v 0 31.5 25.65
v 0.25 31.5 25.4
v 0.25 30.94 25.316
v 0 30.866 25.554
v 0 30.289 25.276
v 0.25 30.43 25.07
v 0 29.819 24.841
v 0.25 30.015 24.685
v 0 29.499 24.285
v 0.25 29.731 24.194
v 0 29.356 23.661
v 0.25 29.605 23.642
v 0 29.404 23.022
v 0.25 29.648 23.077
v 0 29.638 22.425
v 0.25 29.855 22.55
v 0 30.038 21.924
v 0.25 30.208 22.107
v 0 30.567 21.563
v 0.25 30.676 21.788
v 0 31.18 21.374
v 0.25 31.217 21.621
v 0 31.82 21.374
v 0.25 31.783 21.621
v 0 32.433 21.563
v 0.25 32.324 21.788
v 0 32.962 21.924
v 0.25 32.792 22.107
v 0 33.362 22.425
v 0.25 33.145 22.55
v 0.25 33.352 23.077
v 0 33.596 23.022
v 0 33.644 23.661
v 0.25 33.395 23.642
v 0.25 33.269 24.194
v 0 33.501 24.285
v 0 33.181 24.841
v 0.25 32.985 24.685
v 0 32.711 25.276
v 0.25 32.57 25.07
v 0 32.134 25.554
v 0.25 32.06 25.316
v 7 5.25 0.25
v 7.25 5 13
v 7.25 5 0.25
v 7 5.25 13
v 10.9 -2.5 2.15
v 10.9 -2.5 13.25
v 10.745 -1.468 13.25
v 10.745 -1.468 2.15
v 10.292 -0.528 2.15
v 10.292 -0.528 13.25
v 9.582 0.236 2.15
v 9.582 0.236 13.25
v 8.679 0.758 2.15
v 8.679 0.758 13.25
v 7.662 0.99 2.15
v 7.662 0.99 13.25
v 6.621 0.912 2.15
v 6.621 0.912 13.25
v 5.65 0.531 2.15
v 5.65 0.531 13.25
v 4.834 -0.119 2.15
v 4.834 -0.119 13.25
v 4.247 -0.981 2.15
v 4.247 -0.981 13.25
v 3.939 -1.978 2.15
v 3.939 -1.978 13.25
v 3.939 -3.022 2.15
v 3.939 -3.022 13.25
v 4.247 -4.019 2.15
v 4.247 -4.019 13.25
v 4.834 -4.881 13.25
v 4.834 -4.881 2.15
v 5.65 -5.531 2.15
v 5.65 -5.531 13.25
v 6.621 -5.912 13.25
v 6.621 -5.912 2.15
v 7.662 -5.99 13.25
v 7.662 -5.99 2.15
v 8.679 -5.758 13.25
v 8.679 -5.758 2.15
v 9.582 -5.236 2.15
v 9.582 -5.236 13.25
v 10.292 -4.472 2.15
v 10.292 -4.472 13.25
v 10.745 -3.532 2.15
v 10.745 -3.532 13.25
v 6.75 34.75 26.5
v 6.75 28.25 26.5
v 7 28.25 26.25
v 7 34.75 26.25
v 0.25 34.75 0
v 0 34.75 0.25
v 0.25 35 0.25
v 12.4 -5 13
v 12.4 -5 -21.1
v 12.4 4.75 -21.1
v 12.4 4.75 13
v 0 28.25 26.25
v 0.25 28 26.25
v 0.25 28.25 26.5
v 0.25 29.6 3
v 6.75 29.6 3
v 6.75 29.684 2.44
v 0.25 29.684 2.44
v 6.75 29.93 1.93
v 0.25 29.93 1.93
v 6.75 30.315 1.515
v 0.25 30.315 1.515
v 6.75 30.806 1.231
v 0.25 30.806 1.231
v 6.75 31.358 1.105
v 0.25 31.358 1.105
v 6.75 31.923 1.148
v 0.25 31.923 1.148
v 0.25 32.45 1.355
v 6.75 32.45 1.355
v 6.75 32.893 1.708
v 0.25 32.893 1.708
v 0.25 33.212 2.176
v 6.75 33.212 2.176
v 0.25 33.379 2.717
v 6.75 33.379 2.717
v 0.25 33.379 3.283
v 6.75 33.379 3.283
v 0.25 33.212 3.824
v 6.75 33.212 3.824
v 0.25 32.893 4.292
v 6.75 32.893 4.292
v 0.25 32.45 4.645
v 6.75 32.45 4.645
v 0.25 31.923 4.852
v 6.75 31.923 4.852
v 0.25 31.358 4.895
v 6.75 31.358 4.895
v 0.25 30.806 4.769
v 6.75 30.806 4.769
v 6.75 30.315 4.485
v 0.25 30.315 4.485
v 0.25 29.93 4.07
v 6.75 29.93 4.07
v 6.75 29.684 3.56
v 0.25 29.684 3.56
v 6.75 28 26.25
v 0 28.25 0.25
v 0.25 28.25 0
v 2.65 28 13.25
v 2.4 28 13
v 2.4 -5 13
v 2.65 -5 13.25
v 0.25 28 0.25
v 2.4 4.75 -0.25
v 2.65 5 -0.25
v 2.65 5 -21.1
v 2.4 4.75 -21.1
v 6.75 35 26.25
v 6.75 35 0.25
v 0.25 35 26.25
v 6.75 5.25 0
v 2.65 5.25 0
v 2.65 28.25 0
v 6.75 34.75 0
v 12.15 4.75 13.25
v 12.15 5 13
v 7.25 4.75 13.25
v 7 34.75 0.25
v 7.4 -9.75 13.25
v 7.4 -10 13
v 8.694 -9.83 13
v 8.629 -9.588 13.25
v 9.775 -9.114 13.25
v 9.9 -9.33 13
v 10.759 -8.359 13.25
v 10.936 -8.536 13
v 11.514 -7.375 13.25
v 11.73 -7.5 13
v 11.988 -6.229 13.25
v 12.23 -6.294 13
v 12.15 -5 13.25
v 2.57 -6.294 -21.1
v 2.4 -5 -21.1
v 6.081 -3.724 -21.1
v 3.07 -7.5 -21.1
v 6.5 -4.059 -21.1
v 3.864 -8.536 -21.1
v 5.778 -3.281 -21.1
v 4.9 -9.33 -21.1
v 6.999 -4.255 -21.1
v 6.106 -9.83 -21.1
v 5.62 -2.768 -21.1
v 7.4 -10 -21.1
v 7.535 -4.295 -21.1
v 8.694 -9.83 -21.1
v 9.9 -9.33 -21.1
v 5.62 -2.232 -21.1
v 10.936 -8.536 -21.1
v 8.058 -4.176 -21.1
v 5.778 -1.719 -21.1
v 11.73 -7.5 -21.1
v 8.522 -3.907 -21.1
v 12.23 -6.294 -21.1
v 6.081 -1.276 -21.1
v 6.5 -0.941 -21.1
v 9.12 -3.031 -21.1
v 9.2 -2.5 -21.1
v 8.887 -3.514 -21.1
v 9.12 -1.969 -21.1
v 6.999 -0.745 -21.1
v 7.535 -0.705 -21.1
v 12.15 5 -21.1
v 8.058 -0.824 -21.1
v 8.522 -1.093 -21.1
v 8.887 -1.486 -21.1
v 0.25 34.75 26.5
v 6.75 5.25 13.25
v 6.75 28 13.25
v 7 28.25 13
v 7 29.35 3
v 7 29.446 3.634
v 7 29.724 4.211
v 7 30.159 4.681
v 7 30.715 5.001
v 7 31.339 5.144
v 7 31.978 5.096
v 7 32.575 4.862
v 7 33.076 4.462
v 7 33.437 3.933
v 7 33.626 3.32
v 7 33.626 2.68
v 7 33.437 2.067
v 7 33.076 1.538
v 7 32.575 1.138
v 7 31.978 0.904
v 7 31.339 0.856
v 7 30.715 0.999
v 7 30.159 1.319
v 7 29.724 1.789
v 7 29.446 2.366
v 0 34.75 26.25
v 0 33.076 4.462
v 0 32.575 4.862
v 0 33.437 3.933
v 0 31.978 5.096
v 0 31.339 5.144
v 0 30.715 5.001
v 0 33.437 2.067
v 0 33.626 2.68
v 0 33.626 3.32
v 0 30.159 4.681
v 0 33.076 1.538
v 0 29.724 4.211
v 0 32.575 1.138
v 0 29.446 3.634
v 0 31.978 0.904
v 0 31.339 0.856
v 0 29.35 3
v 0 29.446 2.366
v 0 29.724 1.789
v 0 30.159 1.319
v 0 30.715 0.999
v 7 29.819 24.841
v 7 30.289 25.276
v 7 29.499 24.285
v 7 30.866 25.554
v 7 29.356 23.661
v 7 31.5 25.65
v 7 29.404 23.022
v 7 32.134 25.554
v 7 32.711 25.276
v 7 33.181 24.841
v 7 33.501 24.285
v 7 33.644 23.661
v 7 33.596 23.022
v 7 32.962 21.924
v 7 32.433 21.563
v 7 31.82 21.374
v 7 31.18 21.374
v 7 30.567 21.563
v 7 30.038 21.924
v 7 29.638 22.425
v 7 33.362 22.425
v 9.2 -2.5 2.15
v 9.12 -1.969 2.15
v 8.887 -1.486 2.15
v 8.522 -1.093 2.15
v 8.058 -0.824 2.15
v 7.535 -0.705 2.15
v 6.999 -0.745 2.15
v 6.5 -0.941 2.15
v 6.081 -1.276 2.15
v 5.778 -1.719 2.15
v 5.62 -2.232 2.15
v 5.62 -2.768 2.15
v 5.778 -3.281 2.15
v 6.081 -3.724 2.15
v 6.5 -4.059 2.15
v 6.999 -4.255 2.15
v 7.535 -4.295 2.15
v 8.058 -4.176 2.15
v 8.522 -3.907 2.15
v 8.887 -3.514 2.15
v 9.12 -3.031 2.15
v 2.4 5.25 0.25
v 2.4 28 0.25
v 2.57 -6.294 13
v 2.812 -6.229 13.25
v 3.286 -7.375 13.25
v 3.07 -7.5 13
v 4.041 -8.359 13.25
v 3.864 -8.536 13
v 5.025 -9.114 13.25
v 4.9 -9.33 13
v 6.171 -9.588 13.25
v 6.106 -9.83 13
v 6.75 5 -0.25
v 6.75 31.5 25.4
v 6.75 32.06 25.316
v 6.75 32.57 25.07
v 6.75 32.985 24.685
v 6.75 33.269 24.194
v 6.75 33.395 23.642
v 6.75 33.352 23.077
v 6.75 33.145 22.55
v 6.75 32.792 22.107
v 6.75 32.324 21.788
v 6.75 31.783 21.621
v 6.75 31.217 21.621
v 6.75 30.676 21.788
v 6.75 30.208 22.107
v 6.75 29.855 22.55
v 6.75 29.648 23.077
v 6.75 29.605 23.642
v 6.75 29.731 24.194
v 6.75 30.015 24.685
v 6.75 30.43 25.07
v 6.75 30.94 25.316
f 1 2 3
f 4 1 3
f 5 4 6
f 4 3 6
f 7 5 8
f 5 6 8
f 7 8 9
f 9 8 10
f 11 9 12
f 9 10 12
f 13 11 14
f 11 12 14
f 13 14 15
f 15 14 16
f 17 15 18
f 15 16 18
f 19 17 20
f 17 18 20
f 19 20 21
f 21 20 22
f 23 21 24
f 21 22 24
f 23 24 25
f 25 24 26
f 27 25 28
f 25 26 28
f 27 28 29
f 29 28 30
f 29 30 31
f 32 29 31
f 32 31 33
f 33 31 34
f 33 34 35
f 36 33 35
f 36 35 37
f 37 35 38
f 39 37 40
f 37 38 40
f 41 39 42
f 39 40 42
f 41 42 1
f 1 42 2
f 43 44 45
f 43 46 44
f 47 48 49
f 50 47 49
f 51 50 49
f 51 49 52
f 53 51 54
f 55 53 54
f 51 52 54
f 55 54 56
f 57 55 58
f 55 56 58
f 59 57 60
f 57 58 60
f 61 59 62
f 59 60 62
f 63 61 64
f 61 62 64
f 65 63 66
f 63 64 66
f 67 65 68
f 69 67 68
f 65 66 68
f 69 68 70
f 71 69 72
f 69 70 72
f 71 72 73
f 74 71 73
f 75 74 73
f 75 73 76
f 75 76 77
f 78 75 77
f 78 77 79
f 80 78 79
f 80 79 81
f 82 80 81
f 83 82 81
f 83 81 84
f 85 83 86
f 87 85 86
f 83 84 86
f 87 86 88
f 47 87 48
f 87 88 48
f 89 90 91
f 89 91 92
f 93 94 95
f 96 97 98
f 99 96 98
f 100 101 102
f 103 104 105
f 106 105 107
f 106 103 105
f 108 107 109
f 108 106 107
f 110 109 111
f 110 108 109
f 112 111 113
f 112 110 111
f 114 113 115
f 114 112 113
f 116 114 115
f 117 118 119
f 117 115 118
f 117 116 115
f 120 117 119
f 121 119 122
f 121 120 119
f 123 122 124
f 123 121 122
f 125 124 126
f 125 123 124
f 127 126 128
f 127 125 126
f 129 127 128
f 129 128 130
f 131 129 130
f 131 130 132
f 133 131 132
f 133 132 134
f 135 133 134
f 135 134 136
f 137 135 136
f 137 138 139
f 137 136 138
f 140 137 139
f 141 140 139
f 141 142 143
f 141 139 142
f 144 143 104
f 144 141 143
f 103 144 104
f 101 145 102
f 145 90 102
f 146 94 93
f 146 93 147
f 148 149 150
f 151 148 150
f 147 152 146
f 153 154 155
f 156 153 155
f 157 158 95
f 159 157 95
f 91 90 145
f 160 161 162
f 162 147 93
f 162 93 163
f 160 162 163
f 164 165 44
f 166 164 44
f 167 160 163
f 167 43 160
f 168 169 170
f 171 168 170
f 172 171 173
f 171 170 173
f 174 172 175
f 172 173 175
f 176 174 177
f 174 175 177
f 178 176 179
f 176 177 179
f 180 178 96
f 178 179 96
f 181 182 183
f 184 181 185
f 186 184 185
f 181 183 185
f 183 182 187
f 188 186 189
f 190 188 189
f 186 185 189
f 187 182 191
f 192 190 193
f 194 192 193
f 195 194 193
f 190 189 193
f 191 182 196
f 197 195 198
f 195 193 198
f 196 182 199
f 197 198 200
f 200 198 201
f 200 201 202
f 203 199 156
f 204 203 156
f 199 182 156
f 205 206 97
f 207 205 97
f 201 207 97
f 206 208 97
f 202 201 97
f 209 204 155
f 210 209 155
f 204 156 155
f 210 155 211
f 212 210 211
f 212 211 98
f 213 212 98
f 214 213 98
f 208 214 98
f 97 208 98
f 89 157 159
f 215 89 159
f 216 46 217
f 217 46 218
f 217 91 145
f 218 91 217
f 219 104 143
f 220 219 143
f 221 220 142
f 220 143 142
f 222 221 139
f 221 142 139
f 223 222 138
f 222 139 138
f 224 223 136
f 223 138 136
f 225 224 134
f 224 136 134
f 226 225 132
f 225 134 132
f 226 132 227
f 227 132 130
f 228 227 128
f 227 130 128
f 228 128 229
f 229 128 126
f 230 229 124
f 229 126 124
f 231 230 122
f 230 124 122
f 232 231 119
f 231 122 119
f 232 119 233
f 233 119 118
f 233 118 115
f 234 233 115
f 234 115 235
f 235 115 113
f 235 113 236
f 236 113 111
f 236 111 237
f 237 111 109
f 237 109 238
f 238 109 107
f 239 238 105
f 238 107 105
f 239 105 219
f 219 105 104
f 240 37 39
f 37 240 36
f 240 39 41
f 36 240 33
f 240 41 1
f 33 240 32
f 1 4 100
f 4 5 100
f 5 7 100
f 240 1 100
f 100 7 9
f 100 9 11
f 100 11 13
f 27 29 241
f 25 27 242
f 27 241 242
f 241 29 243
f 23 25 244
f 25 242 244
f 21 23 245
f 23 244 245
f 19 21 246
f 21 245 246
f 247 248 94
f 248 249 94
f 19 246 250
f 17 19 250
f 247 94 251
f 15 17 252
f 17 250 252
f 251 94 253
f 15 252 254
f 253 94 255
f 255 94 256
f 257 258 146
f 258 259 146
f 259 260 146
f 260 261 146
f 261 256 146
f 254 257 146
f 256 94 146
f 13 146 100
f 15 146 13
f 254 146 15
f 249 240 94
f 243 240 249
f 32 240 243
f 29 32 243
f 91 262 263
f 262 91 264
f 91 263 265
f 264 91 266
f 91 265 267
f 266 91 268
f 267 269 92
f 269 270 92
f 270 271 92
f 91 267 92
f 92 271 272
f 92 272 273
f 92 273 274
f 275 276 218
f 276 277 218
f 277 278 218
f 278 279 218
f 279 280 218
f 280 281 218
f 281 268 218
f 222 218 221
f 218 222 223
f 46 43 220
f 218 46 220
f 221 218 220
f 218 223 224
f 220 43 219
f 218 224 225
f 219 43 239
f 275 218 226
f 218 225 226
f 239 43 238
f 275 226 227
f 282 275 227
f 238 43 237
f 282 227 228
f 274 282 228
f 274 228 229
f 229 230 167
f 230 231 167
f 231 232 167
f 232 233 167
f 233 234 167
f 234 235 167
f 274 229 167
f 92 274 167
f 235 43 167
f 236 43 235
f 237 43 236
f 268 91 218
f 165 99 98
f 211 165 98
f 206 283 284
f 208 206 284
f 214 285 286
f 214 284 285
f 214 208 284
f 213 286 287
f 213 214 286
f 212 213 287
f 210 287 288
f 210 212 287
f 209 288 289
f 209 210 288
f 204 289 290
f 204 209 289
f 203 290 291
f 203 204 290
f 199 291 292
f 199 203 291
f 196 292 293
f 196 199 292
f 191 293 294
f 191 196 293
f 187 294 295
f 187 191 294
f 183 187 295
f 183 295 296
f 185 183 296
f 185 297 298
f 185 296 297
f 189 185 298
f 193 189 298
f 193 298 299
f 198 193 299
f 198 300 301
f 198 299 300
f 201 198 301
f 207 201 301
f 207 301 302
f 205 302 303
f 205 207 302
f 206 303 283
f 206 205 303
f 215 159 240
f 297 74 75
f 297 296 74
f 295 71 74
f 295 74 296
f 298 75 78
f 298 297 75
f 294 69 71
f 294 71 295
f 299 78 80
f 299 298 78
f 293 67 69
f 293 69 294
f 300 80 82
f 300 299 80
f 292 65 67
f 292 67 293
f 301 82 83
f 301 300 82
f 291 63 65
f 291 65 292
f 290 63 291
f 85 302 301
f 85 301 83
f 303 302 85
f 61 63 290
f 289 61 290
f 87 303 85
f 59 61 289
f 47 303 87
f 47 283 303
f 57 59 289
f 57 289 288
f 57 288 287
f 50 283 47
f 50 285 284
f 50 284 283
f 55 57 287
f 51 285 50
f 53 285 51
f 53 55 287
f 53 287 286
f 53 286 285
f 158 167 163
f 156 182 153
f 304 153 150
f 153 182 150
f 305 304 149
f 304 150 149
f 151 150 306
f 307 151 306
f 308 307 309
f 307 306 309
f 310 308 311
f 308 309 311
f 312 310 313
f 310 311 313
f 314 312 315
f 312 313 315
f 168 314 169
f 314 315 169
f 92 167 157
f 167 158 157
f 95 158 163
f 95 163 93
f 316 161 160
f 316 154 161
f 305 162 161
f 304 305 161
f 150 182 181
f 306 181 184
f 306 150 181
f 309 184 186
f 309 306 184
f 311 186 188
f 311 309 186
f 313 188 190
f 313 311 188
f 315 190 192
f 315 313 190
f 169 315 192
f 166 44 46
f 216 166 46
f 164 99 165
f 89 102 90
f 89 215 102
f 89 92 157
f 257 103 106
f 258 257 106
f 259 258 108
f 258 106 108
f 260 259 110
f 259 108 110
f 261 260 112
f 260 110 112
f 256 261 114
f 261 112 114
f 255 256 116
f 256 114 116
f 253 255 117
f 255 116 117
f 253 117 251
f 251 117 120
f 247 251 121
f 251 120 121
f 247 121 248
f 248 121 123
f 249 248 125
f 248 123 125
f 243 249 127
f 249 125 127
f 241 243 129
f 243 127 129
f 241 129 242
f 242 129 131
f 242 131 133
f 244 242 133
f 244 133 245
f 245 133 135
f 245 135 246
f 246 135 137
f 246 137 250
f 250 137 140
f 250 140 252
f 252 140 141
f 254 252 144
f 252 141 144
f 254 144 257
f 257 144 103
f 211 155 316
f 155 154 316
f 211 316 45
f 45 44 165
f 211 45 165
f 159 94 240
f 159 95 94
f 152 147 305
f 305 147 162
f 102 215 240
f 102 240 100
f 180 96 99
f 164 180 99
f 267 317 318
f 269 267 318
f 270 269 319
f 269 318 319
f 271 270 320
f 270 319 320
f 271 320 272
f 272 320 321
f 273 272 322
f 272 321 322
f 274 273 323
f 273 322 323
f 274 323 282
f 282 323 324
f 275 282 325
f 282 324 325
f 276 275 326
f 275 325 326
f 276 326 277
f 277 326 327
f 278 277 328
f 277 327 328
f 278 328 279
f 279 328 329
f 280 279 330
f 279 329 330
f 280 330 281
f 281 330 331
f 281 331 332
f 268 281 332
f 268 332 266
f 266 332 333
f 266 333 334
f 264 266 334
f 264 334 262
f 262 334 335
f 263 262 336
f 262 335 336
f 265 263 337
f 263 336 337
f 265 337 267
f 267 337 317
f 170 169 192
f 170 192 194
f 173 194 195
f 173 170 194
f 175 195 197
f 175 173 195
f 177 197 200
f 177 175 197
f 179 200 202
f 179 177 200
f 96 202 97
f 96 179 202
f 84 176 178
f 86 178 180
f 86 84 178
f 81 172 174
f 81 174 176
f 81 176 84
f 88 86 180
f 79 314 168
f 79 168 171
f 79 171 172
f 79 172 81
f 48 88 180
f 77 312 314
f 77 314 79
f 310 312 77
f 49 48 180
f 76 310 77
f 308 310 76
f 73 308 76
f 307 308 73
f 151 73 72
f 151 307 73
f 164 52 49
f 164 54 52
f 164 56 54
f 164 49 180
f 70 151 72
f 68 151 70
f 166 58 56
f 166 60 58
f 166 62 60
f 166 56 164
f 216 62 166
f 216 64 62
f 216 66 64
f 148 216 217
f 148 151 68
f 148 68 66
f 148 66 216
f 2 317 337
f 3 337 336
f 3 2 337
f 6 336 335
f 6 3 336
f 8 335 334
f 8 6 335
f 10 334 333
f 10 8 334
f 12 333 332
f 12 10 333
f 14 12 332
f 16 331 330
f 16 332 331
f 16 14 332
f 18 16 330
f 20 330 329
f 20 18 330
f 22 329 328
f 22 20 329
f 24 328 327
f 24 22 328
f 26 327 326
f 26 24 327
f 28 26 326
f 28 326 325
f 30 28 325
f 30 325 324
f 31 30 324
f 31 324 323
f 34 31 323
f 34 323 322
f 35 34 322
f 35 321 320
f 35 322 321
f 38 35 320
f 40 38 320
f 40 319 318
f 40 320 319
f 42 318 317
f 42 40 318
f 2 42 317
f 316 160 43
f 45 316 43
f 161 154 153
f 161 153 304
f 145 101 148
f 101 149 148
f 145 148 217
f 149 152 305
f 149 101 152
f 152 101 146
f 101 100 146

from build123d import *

# Parameters (mm, degrees)
BOSS_EXTRUDE1_DEPTH             = 26.5
SKETCH2_W                       = 10
SKETCH2_H                       = 15
BOSS_EXTRUDE2_DEPTH             = 21.1
BOSS_EXTRUDE2_DIRECTION_2_REACH = 46.455
SKETCH3_W                       = 13.25
SKETCH3_H                       = 38
CUT_EXTRUDE1_DEPTH              = 21.1
CUT_EXTRUDE2_DEPTH              = 46.618088518
CUT_EXTRUDE2_DEPTH_BACK         = 46.618088518
SKETCH4_R                       = 1.8
SKETCH5_R                       = 3.5
CUT_EXTRUDE3_DEPTH              = 11.1
SKETCH6_R                       = 1.9
CUT_EXTRUDE4_DEPTH              = 46.618088518
FILLET1_R                       = 5
CHAMFER1_SIZE                   = 0.25


with BuildPart() as part:
    # Sketch1 → Boss-Extrude1 (new body)
    with BuildSketch(Plane.XY):
        Polygon((0, 35), (0, 28), (2.4, 28), (2.4, -10), (7, -10), (7, 35), align=None)
    extrude(amount=BOSS_EXTRUDE1_DEPTH)

    # Sketch2 → Boss-Extrude2 (add)
    with BuildSketch(Plane.XY):
        with Locations((7.4, -2.5)):
            Rectangle(SKETCH2_W, SKETCH2_H)
    extrude(amount=-BOSS_EXTRUDE2_DEPTH)

    # Boss-Extrude2 direction 2: up to this face of the body (flat: up to its plane)
    boss_extrude2_direction_2_end = Plane(part.part.faces().sort_by_distance((4.437265416, 13.926273458, 26.5))[0])
    # Sketch2 → Boss-Extrude2 direction 2 (add, up to the picked face)
    with BuildSketch(Plane.XY, mode=Mode.PRIVATE) as boss_extrude2_direction_2_sk1:
        with Locations((7.4, -2.5)):
            Rectangle(SKETCH2_W, SKETCH2_H)
    boss_extrude2_direction_2_tool1 = split(extrude(boss_extrude2_direction_2_sk1.sketch, amount=BOSS_EXTRUDE2_DIRECTION_2_REACH, mode=Mode.PRIVATE), bisect_by=boss_extrude2_direction_2_end, keep=Keep.BOTH, mode=Mode.PRIVATE)
    add(boss_extrude2_direction_2_tool1.solids().sort_by(Axis((7.4, -2.5, 0), (0, 0, 1)))[0])

    # Sketch3 → Cut-Extrude1 (cut)
    with BuildSketch(Plane(origin=(0, 0, 0), x_dir=(0, 0, -1), z_dir=(1, 0, 0))):
        with Locations((-19.875, 9)):
            Rectangle(SKETCH3_W, SKETCH3_H)
    extrude(amount=CUT_EXTRUDE1_DEPTH, mode=Mode.SUBTRACT)

    # Sketch4 → Cut-Extrude2 (cut, two sides: drawn at the far end of the back side and taken through both)
    with BuildSketch(Plane.XY.offset(-CUT_EXTRUDE2_DEPTH_BACK)):
        with Locations((7.4, -2.5)):
            Circle(SKETCH4_R)
    extrude(amount=CUT_EXTRUDE2_DEPTH + CUT_EXTRUDE2_DEPTH_BACK, mode=Mode.SUBTRACT)

    # Sketch5 → Cut-Extrude3 (cut)
    with BuildSketch(Plane.XY.offset(13.25)):
        with Locations((7.4, -2.5)):
            Circle(SKETCH5_R)
    extrude(amount=-CUT_EXTRUDE3_DEPTH, mode=Mode.SUBTRACT)

    # Sketch6 → Cut-Extrude4 (cut, through all)
    with BuildSketch(Plane(origin=(0, 0, 0), x_dir=(0, 0, -1), z_dir=(1, 0, 0))):
        with Locations(Location((-3, 31.5, 0), (0, 0, 270))):
            Circle(SKETCH6_R)
        with Locations(Location((-23.5, 31.5, 0), (0, 0, 180))):
            Circle(SKETCH6_R)
    extrude(amount=CUT_EXTRUDE4_DEPTH, mode=Mode.SUBTRACT)

    # Fillet1
    fillet1_edges = [part.edges().sort_by_distance(p)[0] for p in [
        (2.4, -10, -3.925),
        (12.4, -10, -3.925),
    ]]
    fillet(fillet1_edges, radius=FILLET1_R - 0.0001)  # a hair under: the kernel refuses the full size

    # Chamfer1
    chamfer1_edges = [part.edges().sort_by_distance(p)[0] for p in [
        (3.864436805, -8.535563195, 13.25),
        (10.935563195, -8.535563195, 13.25),
        (7, 35, 13.25),
        (0, 28, 13.25),
        (0, 35, 13.25),
        (3.5, 28, 26.5),
        (7, 20, 0),
        (4.7, 5, 0),
        (2.4, 5, -10.55),
        (7, 5, 6.625),
        (12.4, 5, -3.925),
        (7, 31.5, 26.5),
        (7, 28, 19.875),
        (2.4, 11.49995, 13.25),
        (9.7, 5, 13.25),
        (7, 16.5, 13.25),
        (3.5, 35, 26.5),
        (2.4, 16.5, 0),
        (1.2, 28, 0),
        (0, 33.4, 3),
        (7, 33.4, 3),
        (0, 31.5, 21.6),
        (7, 31.5, 21.6),
        (0, 31.5, 0),
        (3.5, 35, 0),
        (0, 31.5, 26.5),
        (12.4, -5e-05, 13.25),
    ]]
    chamfer(chamfer1_edges, length=CHAMFER1_SIZE)


solid = part.part
